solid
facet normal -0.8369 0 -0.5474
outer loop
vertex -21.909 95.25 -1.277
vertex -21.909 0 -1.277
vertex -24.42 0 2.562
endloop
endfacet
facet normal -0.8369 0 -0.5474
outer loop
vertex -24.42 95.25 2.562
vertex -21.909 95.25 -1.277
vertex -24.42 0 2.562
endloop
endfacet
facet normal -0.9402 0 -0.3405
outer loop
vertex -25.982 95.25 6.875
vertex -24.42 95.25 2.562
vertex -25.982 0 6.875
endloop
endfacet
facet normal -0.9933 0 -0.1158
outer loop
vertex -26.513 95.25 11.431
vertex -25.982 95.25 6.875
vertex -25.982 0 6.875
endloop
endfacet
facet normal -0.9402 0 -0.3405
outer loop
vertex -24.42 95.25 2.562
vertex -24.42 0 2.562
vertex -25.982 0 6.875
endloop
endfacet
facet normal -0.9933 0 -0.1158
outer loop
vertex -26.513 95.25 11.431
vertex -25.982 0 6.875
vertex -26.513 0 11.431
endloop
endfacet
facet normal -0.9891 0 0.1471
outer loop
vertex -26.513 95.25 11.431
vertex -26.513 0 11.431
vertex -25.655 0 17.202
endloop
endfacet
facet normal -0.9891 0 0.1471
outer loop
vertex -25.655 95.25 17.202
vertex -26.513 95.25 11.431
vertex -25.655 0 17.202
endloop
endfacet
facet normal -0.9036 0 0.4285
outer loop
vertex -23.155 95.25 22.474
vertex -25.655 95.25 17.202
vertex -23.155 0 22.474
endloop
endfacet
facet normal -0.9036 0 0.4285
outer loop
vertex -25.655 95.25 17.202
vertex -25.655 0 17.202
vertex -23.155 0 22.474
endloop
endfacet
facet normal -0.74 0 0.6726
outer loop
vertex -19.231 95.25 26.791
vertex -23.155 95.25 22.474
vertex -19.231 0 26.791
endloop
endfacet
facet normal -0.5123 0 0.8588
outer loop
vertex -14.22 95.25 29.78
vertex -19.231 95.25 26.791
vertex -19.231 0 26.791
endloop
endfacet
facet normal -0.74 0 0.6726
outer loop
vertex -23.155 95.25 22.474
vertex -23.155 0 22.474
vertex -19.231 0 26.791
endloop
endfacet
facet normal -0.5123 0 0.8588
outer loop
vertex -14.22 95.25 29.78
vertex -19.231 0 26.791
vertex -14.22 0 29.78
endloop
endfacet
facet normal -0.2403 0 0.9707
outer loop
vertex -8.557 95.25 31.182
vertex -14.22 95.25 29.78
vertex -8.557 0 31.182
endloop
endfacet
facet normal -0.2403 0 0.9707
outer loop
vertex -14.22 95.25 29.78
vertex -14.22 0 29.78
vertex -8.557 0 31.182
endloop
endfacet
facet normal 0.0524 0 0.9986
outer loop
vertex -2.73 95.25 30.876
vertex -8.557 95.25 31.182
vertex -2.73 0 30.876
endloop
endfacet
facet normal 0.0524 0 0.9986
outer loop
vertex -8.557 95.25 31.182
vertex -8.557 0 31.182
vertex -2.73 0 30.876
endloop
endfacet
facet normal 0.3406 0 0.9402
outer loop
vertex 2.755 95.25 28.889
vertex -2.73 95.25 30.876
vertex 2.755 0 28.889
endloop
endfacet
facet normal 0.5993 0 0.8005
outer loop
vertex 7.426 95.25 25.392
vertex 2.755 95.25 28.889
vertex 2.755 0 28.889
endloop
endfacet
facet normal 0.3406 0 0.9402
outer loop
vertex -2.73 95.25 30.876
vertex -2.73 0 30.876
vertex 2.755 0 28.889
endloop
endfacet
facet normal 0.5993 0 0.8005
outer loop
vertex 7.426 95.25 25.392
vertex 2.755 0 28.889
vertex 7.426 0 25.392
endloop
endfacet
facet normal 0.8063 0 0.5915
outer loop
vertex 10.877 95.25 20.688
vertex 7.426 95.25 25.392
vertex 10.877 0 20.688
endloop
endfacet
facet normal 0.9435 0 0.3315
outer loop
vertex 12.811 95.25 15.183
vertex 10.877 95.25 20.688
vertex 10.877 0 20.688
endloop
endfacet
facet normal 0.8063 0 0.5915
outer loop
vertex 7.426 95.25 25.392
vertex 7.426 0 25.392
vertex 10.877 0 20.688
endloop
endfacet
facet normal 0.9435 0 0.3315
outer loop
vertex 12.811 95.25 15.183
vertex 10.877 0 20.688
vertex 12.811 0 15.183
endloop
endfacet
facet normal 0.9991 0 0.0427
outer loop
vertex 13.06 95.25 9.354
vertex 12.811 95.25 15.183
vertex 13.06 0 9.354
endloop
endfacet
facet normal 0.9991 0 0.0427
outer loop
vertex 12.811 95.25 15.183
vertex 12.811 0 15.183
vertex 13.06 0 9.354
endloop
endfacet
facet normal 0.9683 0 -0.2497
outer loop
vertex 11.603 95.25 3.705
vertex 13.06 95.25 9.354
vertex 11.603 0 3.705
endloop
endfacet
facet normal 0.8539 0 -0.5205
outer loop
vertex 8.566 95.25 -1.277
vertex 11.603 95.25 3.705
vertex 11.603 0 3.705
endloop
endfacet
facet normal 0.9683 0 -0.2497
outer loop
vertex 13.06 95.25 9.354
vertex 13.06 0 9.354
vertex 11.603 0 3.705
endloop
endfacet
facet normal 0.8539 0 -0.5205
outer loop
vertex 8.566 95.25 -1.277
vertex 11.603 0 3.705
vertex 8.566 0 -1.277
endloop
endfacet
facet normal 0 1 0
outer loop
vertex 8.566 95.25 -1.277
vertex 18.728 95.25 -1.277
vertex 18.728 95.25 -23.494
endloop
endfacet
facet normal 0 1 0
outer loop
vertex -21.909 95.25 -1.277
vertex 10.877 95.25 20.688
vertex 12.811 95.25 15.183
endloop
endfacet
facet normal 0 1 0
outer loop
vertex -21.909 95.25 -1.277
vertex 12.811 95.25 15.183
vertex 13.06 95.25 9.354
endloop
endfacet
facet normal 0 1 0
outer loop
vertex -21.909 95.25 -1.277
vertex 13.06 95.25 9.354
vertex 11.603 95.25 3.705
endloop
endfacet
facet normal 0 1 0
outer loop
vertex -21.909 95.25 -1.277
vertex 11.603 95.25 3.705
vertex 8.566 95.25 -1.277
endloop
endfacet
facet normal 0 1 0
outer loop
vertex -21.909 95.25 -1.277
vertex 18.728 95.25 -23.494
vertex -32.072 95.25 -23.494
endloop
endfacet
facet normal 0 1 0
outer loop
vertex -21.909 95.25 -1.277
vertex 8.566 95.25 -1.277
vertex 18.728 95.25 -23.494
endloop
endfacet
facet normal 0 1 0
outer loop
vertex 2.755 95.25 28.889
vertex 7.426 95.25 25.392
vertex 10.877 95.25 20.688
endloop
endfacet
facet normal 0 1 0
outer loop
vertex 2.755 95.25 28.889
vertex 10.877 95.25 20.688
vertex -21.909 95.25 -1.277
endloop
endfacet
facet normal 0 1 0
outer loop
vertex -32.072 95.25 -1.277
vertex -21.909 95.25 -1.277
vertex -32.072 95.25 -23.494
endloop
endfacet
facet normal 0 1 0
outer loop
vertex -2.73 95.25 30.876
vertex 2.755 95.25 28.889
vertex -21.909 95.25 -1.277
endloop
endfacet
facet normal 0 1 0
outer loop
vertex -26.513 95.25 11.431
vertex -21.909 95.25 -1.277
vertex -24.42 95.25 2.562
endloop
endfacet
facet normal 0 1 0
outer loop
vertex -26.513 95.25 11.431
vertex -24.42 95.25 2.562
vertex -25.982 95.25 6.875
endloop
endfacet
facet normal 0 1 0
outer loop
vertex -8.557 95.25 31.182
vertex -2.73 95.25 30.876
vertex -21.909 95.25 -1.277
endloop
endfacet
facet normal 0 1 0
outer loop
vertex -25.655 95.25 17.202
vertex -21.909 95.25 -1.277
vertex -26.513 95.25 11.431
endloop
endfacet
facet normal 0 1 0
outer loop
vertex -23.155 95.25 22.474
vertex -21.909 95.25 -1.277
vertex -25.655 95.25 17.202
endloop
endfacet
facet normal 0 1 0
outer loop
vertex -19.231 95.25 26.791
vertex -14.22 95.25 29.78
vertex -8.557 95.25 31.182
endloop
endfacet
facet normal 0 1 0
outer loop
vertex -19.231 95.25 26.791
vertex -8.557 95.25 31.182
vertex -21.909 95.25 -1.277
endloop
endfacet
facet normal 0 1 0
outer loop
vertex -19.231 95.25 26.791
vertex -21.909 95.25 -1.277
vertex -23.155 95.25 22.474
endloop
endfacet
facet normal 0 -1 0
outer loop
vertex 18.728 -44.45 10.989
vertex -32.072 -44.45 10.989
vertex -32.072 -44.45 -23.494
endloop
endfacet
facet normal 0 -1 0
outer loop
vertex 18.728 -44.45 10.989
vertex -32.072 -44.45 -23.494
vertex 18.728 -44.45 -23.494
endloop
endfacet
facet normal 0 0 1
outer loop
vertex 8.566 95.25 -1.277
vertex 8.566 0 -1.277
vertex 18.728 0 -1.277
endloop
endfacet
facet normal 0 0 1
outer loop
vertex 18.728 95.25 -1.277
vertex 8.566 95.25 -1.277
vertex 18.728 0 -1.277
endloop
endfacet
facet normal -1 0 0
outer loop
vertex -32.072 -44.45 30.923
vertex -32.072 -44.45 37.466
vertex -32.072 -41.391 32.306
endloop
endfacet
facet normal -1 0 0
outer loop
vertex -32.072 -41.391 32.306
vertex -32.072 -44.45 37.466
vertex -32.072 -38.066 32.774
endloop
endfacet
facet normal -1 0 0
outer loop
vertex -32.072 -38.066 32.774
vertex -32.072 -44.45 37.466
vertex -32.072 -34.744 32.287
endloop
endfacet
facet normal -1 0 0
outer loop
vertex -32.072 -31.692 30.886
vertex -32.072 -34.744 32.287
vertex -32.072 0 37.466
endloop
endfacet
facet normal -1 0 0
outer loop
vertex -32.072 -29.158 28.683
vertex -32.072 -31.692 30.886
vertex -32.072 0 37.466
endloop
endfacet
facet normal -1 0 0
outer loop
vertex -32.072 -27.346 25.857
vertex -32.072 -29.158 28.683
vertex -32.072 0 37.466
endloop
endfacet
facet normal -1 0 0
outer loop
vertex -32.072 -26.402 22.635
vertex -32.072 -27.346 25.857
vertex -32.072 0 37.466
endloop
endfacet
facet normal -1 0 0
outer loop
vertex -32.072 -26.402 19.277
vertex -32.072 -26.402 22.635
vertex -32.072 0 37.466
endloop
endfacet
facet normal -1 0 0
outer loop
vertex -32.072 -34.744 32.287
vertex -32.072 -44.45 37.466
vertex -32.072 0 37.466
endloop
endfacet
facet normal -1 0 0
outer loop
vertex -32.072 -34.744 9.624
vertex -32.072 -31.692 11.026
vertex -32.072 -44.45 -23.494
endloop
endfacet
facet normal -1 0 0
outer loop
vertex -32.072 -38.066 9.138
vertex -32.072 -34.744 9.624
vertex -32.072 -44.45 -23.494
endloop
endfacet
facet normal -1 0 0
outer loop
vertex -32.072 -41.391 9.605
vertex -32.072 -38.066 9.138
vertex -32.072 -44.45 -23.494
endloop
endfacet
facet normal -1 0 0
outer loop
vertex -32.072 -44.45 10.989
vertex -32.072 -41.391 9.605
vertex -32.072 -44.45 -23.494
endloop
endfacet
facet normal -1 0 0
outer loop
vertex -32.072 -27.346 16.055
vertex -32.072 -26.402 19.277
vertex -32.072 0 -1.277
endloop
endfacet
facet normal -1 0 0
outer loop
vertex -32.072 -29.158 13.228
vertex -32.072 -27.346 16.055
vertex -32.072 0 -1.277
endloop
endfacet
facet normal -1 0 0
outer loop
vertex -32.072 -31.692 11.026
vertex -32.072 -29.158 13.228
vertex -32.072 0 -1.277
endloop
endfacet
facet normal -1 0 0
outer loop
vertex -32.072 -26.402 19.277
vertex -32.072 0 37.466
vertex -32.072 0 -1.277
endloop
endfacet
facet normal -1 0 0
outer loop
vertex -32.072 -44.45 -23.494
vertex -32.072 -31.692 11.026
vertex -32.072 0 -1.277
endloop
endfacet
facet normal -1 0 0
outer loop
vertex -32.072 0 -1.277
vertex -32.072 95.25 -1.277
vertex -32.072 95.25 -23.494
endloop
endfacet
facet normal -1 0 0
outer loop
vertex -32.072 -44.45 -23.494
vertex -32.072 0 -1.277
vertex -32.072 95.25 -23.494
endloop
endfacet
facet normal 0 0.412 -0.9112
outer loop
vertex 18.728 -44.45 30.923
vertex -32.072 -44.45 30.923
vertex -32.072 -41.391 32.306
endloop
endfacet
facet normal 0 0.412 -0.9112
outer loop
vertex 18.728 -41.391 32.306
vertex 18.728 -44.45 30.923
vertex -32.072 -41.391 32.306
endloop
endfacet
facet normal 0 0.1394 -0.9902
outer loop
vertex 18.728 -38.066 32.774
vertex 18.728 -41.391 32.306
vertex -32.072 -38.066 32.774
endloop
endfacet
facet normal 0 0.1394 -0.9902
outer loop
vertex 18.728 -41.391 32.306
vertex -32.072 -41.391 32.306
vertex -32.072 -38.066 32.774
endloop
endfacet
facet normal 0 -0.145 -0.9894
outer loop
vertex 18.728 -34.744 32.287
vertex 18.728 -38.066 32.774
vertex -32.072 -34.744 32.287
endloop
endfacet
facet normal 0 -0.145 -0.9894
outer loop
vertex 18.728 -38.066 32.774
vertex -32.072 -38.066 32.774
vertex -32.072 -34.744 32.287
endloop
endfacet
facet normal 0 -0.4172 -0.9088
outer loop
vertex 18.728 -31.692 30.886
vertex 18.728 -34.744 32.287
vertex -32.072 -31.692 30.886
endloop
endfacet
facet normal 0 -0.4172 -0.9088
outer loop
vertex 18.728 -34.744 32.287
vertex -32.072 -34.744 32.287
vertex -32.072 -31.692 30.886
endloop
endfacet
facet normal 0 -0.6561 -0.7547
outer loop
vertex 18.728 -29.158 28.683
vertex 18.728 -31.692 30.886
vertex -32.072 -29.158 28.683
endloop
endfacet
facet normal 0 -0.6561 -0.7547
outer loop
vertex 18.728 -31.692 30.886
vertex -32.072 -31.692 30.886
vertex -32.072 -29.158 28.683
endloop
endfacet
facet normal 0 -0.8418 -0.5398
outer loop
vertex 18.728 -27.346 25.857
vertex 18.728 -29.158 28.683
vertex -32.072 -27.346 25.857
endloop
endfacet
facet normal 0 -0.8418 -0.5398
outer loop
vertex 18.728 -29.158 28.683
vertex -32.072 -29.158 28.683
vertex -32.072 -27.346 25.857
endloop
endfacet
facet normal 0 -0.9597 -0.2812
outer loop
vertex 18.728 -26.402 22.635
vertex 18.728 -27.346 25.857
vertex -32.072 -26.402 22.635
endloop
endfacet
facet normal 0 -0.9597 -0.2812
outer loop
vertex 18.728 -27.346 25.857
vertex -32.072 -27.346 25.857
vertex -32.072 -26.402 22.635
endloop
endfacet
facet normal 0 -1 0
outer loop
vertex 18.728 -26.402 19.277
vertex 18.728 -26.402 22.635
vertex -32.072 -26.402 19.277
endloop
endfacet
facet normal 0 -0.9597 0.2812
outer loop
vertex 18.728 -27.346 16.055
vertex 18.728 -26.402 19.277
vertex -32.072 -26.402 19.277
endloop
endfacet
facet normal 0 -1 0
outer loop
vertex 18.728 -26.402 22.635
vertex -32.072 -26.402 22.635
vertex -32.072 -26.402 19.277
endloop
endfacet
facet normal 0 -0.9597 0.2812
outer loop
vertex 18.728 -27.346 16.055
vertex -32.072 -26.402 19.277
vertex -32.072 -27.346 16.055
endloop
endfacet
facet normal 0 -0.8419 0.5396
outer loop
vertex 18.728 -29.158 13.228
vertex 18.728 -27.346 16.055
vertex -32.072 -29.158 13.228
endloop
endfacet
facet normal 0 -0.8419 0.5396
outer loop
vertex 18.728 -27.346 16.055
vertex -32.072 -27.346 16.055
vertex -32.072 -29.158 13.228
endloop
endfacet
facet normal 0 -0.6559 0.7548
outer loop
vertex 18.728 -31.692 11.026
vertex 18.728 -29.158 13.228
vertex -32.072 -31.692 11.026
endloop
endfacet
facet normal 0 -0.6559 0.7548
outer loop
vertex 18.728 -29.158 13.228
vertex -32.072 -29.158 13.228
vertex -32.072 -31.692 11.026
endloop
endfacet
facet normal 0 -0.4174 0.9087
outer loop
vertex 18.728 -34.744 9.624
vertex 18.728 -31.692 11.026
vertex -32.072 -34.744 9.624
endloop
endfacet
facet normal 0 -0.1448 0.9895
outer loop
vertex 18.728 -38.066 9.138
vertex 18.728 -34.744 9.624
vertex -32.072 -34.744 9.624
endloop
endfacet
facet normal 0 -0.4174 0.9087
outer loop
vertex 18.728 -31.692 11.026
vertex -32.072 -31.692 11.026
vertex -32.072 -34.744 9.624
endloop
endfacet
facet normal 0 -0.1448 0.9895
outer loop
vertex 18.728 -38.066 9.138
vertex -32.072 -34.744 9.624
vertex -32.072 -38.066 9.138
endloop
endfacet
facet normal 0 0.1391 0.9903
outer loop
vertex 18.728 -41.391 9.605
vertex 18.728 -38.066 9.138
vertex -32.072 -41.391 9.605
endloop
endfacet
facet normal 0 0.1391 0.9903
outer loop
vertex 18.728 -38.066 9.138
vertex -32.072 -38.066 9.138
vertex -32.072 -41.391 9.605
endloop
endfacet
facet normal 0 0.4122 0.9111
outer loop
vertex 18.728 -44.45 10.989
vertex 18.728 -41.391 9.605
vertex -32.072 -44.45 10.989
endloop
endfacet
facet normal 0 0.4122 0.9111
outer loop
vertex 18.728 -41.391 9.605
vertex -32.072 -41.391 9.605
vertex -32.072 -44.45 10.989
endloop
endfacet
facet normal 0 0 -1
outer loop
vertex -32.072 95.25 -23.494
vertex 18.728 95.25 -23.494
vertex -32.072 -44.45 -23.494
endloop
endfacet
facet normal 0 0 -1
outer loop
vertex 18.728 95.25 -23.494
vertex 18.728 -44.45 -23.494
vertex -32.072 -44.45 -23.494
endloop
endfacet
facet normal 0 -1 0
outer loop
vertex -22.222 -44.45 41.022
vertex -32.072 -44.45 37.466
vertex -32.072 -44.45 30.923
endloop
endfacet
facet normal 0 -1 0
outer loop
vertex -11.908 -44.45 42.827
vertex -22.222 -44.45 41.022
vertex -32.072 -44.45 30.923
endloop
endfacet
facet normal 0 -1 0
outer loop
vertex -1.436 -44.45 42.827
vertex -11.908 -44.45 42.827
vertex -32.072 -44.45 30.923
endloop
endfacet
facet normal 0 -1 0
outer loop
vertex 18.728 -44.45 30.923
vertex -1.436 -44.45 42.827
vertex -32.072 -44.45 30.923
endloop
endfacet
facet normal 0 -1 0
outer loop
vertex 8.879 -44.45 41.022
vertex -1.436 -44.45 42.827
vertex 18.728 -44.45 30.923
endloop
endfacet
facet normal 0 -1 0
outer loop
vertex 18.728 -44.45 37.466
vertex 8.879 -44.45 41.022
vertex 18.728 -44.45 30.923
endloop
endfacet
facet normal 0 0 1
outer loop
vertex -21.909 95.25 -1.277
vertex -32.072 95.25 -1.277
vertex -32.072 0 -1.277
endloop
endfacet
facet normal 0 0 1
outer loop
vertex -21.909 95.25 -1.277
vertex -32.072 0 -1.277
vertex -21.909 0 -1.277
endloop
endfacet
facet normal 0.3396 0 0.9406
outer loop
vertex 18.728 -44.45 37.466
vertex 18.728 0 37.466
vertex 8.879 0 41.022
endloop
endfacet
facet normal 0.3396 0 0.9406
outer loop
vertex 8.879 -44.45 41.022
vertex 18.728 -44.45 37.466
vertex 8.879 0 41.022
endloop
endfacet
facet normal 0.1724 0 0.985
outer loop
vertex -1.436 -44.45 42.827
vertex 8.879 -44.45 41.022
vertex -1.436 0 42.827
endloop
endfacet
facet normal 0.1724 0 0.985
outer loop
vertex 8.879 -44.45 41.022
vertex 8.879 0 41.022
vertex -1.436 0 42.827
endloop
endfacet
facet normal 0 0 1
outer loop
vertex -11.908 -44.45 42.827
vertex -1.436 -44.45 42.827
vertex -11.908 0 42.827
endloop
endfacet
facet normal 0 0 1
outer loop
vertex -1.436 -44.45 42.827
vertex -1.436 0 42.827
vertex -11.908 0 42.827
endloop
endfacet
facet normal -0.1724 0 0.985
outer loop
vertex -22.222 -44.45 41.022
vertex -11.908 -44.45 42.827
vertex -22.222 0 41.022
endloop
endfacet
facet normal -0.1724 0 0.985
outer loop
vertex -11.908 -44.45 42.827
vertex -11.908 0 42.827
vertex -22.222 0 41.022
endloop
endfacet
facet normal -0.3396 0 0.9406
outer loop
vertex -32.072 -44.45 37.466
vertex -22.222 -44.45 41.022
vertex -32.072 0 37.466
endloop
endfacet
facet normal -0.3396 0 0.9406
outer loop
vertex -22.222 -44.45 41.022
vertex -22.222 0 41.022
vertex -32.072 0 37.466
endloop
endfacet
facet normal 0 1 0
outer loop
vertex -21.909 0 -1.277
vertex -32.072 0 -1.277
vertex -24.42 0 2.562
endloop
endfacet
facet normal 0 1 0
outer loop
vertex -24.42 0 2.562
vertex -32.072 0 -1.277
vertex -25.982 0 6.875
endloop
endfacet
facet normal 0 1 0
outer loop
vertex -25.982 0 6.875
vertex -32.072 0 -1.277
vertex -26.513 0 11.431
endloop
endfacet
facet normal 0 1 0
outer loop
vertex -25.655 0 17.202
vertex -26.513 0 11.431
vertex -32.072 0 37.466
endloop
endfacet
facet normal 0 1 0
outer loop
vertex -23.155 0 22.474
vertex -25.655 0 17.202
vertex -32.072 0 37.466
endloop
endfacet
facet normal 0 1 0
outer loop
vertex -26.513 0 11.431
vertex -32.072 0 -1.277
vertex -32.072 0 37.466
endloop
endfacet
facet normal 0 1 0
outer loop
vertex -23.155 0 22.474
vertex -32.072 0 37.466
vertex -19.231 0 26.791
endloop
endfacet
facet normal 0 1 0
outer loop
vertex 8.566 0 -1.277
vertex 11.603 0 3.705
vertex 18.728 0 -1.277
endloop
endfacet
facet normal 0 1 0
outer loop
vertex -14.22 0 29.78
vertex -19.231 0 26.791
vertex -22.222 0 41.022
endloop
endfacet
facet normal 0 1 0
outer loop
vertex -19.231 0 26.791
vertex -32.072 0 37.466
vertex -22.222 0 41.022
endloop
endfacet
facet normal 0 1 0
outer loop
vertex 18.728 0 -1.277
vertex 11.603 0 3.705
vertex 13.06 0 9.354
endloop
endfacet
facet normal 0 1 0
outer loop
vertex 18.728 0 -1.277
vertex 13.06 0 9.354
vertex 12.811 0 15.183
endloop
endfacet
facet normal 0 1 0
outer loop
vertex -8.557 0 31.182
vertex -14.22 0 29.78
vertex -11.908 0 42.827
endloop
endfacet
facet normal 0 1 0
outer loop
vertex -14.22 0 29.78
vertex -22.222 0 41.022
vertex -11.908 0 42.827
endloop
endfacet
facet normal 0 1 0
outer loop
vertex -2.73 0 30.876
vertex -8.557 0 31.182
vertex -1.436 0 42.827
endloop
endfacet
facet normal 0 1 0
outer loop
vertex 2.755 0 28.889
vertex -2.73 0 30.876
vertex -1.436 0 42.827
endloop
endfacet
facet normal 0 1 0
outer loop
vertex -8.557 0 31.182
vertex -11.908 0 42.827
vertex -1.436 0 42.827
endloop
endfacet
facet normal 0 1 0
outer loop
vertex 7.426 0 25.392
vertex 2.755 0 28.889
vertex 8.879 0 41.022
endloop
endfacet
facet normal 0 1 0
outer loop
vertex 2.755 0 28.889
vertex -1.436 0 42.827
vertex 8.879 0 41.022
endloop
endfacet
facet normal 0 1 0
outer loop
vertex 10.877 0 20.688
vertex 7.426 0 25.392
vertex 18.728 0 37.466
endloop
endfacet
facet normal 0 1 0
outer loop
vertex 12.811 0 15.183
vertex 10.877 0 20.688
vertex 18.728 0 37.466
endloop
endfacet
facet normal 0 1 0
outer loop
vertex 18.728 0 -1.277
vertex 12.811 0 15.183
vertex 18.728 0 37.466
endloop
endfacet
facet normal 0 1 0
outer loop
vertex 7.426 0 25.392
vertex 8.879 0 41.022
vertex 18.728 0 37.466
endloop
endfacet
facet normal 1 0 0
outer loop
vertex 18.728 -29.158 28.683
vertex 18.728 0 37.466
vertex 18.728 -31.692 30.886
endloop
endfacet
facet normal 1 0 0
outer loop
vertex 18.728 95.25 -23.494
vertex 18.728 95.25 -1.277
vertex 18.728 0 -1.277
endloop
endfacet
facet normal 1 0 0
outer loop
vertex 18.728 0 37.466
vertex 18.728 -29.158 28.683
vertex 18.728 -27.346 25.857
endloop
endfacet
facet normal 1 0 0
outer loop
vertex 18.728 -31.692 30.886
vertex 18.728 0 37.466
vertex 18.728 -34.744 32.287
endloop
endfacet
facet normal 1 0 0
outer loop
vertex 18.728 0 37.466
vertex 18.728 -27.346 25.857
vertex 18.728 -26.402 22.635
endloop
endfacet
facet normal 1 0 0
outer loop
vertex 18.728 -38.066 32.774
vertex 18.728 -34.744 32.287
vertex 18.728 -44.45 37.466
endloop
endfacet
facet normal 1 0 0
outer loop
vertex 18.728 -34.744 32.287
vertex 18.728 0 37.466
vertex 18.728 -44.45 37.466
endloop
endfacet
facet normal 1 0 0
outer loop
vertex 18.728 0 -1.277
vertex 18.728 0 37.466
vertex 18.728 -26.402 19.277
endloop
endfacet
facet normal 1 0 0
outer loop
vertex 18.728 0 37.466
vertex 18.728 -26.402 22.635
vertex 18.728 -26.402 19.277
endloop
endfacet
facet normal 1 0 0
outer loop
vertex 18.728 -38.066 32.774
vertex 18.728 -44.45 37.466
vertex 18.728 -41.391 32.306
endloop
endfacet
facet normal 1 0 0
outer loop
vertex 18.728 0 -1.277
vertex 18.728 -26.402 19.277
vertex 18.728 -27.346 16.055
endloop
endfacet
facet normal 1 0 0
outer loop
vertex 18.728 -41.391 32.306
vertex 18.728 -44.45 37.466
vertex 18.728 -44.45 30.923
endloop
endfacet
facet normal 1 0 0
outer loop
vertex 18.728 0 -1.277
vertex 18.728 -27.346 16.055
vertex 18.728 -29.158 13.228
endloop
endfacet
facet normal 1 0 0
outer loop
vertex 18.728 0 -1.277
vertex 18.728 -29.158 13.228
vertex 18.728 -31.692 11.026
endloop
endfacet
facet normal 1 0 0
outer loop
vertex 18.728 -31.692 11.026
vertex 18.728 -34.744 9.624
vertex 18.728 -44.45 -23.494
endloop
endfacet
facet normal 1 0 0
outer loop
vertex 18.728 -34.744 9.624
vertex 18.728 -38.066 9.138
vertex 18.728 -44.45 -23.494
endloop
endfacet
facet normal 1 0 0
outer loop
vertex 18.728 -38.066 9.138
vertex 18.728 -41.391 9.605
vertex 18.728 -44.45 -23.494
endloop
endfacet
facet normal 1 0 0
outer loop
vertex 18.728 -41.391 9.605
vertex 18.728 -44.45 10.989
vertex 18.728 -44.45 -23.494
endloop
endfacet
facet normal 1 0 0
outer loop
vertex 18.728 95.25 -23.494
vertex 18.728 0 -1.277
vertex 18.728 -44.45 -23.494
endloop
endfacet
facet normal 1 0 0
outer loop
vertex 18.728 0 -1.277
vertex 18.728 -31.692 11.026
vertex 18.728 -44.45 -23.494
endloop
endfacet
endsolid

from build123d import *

# Parameters (mm, degrees)
F1_DEPTH = 44.45
F3_DEPTH = 50.8
F5_DEPTH = 95.25


with BuildPart() as f1:
    # F0 (on Front) → F1 (new body)
    with BuildSketch(Plane.XZ):
        with BuildLine():
            Line((-32.0718213916, -23.4942715615), (18.7281786084, -23.4942715615))
            Line((18.7281786084, -23.4942715615), (18.7281786084, 37.4657284385))
            ThreePointArc((18.7281786084, 37.4657284385), (-6.6718213916, 43.0537284385), (-32.0718213916, 37.4657284385))
            Line((-32.0718213916, 37.4657284385), (-32.0718213916, -23.4942715615))
        make_face()
    extrude(amount=F1_DEPTH)

    # F2 (on face) → F3 (cut)
    with BuildSketch(Plane(origin=(-32.0718213916, 0, 0), x_dir=(0, -1, 0), z_dir=(-1, 0, 0))):
        with BuildLine():
            Line((44.45, 10.9887497426), (44.45, 30.9227071344))
            ThreePointArc((44.45, 30.9227071344), (26.2820829109, 20.9557284385), (44.45, 10.9887497426))
        make_face()
    extrude(amount=-F3_DEPTH, mode=Mode.SUBTRACT)

    # F4 (on face) → F5 (join)
    with BuildSketch(Plane(origin=(0, 0, 0), x_dir=(-1, 0, 0), z_dir=(0, 1, 0))):
        with BuildLine():
            ThreePointArc((26.5125769861, 11.4307284385), (-0.0859693436, 30.0851608057), (-8.5655071407, -1.276726136))
            Line((-8.5655071407, -1.276726136), (21.9091499238, -1.276726136))
            ThreePointArc((21.9091499238, -1.276726136), (25.3262537588, 4.6729377033), (26.5125769861, 11.4307284385))
        make_face()
        with BuildLine():
            Line((-18.7281786084, -1.276726136), (-18.7281786084, -23.4942715615))
            Line((-18.7281786084, -23.4942715615), (32.0718213916, -23.4942715615))
            Line((32.0718213916, -23.4942715615), (32.0718213916, -1.276726136))
            Line((32.0718213916, -1.276726136), (21.9091499238, -1.276726136))
            ThreePointArc((21.9091499238, -1.276726136), (6.6718213916, -8.410027156), (-8.5655071407, -1.276726136))
            Line((-8.5655071407, -1.276726136), (-18.7281786084, -1.276726136))
        make_face()
        with BuildLine():
            Line((21.9091499238, -1.276726136), (-8.5655071407, -1.276726136))
            ThreePointArc((-8.5655071407, -1.276726136), (6.6718213916, -8.410027156), (21.9091499238, -1.276726136))
        make_face()
    extrude(amount=F5_DEPTH)


solid = f1.part
